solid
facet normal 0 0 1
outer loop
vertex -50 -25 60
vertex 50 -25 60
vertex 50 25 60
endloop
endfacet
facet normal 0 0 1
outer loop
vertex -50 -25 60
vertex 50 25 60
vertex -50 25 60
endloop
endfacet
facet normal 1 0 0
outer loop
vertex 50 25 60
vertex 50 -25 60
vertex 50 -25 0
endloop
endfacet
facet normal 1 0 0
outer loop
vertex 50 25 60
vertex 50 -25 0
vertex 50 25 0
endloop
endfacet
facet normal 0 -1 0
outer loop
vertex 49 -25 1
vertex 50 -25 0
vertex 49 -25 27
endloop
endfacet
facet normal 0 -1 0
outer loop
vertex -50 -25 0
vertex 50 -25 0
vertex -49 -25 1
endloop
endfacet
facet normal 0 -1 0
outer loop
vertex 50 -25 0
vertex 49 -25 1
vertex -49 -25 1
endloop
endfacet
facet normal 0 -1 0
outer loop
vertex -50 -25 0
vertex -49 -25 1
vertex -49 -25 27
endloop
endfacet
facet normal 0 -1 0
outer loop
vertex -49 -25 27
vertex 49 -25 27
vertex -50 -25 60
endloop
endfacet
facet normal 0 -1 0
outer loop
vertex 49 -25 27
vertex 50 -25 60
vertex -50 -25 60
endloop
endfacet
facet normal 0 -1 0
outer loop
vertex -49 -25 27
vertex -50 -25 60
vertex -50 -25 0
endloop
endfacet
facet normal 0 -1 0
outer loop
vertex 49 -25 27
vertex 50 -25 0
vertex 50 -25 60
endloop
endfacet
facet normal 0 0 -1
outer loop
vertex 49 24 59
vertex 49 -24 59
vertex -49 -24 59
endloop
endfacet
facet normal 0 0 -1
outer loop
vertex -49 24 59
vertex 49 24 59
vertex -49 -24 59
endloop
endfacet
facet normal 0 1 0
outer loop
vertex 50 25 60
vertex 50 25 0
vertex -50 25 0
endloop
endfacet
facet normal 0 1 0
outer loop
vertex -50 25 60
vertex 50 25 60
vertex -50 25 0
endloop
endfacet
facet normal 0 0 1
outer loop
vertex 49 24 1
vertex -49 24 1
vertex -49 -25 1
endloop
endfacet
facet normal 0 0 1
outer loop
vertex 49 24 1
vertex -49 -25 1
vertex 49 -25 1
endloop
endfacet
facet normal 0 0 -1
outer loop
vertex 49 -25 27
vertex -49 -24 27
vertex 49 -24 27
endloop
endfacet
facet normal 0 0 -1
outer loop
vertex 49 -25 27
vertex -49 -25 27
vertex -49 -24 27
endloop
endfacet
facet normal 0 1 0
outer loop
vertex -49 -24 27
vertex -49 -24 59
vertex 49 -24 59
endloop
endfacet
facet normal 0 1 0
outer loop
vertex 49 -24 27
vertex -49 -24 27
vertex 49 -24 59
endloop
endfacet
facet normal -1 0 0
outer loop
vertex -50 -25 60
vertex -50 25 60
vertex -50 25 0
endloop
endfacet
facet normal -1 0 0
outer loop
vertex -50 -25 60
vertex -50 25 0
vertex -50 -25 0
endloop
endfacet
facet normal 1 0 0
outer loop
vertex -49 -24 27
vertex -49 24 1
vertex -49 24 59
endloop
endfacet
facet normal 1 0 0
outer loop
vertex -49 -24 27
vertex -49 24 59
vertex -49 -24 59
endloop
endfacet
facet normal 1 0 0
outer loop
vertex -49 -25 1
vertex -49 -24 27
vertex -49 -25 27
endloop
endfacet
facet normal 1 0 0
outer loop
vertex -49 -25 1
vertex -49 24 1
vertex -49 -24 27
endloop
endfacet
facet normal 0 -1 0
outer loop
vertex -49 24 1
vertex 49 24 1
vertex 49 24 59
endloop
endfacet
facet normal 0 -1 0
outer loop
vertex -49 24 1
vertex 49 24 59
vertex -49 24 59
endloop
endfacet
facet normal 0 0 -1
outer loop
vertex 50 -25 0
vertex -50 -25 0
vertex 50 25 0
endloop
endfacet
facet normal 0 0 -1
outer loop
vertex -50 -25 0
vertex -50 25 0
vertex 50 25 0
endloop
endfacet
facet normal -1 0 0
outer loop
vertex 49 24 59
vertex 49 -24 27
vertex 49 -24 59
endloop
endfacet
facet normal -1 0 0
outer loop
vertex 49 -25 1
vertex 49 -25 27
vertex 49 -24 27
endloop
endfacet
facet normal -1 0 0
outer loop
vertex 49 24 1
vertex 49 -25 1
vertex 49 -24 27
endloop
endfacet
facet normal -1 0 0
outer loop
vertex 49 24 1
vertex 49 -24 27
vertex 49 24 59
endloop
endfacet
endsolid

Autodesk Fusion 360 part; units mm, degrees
sketch "Sketch1" plane through (0, 0, 0) normal (0, 0, 1) x (1, 0, 0)
  line L0 (-50, -25) -> (50, -25)
  line L1 (50, -25) -> (50, 25)
  line L2 (50, 25) -> (-50, 25)
  line L3 (-50, 25) -> (-50, -25)
extrude "Extrude1" add sketch "Sketch1" along normal blind 1
sketch "Sketch2" plane through (0, 0, 1) normal (0, 0, 1) x (-1, 0, 0)
  line L0 (50, -25) -> (50, 25)
  line L1 (50, 25) -> (-50, 25)
  line L2 (-50, 25) -> (-50, -25)
  line L3 (-50, -25) -> (50, -25)
  line L4 (49, 24) -> (-49, 24)
  line L5 (-49, 24) -> (-49, -24)
  line L6 (-49, -24) -> (49, -24)
  line L7 (49, -24) -> (49, 24)
  line L8 (49, 24) -> (49, 25)
  line L9 (-49, 24) -> (-49, 25)
  dimension "d3" = -1
extrude "Extrude2" add sketch "Sketch2" along normal blind 59 contours L0 L1 L2 L3 L5 L6 L7 L8 L9
sketch "Sketch3" plane through (0, 0, 60) normal (0, 0, 1) x (-1, 0, 0)
  line L0 (-49, -24) -> (-49, 25)
  line L1 (-49, 25) -> (-50, 25)
  line L2 (-50, 25) -> (-50, -25)
  line L3 (-50, -25) -> (50, -25)
  line L4 (50, -25) -> (50, 25)
  line L5 (50, 25) -> (49, 25)
  line L6 (49, 25) -> (49, -24)
  line L7 (49, -24) -> (-49, -24)
  line L8 (50, -25) -> (-50, -25)
  line L9 (-50, -25) -> (-50, 25)
  line L10 (-50, 25) -> (50, 25)
  line L11 (50, 25) -> (50, -25)
extrude "Extrude3" add sketch "Sketch3" against normal blind 1 contours L0 L6 L7 L10
sketch "Sketch4" plane through (0, 0, 59) normal (0, 0, -1) x (1, 0, 0)
  line L0 (-49, -24) -> (49, -24)
  line L1 (49, -24) -> (49, 25)
  line L2 (49, 25) -> (-49, 25)
  line L3 (-49, 25) -> (-49, -24)
  line L4 (-49, 25) -> (-49, 24)
  line L5 (-49, 24) -> (49, 24)
  dimension "d8" = 1
extrude "Extrude4" add sketch "Sketch4" along normal blind 32 contours L1 L2 L3 L4 L5
